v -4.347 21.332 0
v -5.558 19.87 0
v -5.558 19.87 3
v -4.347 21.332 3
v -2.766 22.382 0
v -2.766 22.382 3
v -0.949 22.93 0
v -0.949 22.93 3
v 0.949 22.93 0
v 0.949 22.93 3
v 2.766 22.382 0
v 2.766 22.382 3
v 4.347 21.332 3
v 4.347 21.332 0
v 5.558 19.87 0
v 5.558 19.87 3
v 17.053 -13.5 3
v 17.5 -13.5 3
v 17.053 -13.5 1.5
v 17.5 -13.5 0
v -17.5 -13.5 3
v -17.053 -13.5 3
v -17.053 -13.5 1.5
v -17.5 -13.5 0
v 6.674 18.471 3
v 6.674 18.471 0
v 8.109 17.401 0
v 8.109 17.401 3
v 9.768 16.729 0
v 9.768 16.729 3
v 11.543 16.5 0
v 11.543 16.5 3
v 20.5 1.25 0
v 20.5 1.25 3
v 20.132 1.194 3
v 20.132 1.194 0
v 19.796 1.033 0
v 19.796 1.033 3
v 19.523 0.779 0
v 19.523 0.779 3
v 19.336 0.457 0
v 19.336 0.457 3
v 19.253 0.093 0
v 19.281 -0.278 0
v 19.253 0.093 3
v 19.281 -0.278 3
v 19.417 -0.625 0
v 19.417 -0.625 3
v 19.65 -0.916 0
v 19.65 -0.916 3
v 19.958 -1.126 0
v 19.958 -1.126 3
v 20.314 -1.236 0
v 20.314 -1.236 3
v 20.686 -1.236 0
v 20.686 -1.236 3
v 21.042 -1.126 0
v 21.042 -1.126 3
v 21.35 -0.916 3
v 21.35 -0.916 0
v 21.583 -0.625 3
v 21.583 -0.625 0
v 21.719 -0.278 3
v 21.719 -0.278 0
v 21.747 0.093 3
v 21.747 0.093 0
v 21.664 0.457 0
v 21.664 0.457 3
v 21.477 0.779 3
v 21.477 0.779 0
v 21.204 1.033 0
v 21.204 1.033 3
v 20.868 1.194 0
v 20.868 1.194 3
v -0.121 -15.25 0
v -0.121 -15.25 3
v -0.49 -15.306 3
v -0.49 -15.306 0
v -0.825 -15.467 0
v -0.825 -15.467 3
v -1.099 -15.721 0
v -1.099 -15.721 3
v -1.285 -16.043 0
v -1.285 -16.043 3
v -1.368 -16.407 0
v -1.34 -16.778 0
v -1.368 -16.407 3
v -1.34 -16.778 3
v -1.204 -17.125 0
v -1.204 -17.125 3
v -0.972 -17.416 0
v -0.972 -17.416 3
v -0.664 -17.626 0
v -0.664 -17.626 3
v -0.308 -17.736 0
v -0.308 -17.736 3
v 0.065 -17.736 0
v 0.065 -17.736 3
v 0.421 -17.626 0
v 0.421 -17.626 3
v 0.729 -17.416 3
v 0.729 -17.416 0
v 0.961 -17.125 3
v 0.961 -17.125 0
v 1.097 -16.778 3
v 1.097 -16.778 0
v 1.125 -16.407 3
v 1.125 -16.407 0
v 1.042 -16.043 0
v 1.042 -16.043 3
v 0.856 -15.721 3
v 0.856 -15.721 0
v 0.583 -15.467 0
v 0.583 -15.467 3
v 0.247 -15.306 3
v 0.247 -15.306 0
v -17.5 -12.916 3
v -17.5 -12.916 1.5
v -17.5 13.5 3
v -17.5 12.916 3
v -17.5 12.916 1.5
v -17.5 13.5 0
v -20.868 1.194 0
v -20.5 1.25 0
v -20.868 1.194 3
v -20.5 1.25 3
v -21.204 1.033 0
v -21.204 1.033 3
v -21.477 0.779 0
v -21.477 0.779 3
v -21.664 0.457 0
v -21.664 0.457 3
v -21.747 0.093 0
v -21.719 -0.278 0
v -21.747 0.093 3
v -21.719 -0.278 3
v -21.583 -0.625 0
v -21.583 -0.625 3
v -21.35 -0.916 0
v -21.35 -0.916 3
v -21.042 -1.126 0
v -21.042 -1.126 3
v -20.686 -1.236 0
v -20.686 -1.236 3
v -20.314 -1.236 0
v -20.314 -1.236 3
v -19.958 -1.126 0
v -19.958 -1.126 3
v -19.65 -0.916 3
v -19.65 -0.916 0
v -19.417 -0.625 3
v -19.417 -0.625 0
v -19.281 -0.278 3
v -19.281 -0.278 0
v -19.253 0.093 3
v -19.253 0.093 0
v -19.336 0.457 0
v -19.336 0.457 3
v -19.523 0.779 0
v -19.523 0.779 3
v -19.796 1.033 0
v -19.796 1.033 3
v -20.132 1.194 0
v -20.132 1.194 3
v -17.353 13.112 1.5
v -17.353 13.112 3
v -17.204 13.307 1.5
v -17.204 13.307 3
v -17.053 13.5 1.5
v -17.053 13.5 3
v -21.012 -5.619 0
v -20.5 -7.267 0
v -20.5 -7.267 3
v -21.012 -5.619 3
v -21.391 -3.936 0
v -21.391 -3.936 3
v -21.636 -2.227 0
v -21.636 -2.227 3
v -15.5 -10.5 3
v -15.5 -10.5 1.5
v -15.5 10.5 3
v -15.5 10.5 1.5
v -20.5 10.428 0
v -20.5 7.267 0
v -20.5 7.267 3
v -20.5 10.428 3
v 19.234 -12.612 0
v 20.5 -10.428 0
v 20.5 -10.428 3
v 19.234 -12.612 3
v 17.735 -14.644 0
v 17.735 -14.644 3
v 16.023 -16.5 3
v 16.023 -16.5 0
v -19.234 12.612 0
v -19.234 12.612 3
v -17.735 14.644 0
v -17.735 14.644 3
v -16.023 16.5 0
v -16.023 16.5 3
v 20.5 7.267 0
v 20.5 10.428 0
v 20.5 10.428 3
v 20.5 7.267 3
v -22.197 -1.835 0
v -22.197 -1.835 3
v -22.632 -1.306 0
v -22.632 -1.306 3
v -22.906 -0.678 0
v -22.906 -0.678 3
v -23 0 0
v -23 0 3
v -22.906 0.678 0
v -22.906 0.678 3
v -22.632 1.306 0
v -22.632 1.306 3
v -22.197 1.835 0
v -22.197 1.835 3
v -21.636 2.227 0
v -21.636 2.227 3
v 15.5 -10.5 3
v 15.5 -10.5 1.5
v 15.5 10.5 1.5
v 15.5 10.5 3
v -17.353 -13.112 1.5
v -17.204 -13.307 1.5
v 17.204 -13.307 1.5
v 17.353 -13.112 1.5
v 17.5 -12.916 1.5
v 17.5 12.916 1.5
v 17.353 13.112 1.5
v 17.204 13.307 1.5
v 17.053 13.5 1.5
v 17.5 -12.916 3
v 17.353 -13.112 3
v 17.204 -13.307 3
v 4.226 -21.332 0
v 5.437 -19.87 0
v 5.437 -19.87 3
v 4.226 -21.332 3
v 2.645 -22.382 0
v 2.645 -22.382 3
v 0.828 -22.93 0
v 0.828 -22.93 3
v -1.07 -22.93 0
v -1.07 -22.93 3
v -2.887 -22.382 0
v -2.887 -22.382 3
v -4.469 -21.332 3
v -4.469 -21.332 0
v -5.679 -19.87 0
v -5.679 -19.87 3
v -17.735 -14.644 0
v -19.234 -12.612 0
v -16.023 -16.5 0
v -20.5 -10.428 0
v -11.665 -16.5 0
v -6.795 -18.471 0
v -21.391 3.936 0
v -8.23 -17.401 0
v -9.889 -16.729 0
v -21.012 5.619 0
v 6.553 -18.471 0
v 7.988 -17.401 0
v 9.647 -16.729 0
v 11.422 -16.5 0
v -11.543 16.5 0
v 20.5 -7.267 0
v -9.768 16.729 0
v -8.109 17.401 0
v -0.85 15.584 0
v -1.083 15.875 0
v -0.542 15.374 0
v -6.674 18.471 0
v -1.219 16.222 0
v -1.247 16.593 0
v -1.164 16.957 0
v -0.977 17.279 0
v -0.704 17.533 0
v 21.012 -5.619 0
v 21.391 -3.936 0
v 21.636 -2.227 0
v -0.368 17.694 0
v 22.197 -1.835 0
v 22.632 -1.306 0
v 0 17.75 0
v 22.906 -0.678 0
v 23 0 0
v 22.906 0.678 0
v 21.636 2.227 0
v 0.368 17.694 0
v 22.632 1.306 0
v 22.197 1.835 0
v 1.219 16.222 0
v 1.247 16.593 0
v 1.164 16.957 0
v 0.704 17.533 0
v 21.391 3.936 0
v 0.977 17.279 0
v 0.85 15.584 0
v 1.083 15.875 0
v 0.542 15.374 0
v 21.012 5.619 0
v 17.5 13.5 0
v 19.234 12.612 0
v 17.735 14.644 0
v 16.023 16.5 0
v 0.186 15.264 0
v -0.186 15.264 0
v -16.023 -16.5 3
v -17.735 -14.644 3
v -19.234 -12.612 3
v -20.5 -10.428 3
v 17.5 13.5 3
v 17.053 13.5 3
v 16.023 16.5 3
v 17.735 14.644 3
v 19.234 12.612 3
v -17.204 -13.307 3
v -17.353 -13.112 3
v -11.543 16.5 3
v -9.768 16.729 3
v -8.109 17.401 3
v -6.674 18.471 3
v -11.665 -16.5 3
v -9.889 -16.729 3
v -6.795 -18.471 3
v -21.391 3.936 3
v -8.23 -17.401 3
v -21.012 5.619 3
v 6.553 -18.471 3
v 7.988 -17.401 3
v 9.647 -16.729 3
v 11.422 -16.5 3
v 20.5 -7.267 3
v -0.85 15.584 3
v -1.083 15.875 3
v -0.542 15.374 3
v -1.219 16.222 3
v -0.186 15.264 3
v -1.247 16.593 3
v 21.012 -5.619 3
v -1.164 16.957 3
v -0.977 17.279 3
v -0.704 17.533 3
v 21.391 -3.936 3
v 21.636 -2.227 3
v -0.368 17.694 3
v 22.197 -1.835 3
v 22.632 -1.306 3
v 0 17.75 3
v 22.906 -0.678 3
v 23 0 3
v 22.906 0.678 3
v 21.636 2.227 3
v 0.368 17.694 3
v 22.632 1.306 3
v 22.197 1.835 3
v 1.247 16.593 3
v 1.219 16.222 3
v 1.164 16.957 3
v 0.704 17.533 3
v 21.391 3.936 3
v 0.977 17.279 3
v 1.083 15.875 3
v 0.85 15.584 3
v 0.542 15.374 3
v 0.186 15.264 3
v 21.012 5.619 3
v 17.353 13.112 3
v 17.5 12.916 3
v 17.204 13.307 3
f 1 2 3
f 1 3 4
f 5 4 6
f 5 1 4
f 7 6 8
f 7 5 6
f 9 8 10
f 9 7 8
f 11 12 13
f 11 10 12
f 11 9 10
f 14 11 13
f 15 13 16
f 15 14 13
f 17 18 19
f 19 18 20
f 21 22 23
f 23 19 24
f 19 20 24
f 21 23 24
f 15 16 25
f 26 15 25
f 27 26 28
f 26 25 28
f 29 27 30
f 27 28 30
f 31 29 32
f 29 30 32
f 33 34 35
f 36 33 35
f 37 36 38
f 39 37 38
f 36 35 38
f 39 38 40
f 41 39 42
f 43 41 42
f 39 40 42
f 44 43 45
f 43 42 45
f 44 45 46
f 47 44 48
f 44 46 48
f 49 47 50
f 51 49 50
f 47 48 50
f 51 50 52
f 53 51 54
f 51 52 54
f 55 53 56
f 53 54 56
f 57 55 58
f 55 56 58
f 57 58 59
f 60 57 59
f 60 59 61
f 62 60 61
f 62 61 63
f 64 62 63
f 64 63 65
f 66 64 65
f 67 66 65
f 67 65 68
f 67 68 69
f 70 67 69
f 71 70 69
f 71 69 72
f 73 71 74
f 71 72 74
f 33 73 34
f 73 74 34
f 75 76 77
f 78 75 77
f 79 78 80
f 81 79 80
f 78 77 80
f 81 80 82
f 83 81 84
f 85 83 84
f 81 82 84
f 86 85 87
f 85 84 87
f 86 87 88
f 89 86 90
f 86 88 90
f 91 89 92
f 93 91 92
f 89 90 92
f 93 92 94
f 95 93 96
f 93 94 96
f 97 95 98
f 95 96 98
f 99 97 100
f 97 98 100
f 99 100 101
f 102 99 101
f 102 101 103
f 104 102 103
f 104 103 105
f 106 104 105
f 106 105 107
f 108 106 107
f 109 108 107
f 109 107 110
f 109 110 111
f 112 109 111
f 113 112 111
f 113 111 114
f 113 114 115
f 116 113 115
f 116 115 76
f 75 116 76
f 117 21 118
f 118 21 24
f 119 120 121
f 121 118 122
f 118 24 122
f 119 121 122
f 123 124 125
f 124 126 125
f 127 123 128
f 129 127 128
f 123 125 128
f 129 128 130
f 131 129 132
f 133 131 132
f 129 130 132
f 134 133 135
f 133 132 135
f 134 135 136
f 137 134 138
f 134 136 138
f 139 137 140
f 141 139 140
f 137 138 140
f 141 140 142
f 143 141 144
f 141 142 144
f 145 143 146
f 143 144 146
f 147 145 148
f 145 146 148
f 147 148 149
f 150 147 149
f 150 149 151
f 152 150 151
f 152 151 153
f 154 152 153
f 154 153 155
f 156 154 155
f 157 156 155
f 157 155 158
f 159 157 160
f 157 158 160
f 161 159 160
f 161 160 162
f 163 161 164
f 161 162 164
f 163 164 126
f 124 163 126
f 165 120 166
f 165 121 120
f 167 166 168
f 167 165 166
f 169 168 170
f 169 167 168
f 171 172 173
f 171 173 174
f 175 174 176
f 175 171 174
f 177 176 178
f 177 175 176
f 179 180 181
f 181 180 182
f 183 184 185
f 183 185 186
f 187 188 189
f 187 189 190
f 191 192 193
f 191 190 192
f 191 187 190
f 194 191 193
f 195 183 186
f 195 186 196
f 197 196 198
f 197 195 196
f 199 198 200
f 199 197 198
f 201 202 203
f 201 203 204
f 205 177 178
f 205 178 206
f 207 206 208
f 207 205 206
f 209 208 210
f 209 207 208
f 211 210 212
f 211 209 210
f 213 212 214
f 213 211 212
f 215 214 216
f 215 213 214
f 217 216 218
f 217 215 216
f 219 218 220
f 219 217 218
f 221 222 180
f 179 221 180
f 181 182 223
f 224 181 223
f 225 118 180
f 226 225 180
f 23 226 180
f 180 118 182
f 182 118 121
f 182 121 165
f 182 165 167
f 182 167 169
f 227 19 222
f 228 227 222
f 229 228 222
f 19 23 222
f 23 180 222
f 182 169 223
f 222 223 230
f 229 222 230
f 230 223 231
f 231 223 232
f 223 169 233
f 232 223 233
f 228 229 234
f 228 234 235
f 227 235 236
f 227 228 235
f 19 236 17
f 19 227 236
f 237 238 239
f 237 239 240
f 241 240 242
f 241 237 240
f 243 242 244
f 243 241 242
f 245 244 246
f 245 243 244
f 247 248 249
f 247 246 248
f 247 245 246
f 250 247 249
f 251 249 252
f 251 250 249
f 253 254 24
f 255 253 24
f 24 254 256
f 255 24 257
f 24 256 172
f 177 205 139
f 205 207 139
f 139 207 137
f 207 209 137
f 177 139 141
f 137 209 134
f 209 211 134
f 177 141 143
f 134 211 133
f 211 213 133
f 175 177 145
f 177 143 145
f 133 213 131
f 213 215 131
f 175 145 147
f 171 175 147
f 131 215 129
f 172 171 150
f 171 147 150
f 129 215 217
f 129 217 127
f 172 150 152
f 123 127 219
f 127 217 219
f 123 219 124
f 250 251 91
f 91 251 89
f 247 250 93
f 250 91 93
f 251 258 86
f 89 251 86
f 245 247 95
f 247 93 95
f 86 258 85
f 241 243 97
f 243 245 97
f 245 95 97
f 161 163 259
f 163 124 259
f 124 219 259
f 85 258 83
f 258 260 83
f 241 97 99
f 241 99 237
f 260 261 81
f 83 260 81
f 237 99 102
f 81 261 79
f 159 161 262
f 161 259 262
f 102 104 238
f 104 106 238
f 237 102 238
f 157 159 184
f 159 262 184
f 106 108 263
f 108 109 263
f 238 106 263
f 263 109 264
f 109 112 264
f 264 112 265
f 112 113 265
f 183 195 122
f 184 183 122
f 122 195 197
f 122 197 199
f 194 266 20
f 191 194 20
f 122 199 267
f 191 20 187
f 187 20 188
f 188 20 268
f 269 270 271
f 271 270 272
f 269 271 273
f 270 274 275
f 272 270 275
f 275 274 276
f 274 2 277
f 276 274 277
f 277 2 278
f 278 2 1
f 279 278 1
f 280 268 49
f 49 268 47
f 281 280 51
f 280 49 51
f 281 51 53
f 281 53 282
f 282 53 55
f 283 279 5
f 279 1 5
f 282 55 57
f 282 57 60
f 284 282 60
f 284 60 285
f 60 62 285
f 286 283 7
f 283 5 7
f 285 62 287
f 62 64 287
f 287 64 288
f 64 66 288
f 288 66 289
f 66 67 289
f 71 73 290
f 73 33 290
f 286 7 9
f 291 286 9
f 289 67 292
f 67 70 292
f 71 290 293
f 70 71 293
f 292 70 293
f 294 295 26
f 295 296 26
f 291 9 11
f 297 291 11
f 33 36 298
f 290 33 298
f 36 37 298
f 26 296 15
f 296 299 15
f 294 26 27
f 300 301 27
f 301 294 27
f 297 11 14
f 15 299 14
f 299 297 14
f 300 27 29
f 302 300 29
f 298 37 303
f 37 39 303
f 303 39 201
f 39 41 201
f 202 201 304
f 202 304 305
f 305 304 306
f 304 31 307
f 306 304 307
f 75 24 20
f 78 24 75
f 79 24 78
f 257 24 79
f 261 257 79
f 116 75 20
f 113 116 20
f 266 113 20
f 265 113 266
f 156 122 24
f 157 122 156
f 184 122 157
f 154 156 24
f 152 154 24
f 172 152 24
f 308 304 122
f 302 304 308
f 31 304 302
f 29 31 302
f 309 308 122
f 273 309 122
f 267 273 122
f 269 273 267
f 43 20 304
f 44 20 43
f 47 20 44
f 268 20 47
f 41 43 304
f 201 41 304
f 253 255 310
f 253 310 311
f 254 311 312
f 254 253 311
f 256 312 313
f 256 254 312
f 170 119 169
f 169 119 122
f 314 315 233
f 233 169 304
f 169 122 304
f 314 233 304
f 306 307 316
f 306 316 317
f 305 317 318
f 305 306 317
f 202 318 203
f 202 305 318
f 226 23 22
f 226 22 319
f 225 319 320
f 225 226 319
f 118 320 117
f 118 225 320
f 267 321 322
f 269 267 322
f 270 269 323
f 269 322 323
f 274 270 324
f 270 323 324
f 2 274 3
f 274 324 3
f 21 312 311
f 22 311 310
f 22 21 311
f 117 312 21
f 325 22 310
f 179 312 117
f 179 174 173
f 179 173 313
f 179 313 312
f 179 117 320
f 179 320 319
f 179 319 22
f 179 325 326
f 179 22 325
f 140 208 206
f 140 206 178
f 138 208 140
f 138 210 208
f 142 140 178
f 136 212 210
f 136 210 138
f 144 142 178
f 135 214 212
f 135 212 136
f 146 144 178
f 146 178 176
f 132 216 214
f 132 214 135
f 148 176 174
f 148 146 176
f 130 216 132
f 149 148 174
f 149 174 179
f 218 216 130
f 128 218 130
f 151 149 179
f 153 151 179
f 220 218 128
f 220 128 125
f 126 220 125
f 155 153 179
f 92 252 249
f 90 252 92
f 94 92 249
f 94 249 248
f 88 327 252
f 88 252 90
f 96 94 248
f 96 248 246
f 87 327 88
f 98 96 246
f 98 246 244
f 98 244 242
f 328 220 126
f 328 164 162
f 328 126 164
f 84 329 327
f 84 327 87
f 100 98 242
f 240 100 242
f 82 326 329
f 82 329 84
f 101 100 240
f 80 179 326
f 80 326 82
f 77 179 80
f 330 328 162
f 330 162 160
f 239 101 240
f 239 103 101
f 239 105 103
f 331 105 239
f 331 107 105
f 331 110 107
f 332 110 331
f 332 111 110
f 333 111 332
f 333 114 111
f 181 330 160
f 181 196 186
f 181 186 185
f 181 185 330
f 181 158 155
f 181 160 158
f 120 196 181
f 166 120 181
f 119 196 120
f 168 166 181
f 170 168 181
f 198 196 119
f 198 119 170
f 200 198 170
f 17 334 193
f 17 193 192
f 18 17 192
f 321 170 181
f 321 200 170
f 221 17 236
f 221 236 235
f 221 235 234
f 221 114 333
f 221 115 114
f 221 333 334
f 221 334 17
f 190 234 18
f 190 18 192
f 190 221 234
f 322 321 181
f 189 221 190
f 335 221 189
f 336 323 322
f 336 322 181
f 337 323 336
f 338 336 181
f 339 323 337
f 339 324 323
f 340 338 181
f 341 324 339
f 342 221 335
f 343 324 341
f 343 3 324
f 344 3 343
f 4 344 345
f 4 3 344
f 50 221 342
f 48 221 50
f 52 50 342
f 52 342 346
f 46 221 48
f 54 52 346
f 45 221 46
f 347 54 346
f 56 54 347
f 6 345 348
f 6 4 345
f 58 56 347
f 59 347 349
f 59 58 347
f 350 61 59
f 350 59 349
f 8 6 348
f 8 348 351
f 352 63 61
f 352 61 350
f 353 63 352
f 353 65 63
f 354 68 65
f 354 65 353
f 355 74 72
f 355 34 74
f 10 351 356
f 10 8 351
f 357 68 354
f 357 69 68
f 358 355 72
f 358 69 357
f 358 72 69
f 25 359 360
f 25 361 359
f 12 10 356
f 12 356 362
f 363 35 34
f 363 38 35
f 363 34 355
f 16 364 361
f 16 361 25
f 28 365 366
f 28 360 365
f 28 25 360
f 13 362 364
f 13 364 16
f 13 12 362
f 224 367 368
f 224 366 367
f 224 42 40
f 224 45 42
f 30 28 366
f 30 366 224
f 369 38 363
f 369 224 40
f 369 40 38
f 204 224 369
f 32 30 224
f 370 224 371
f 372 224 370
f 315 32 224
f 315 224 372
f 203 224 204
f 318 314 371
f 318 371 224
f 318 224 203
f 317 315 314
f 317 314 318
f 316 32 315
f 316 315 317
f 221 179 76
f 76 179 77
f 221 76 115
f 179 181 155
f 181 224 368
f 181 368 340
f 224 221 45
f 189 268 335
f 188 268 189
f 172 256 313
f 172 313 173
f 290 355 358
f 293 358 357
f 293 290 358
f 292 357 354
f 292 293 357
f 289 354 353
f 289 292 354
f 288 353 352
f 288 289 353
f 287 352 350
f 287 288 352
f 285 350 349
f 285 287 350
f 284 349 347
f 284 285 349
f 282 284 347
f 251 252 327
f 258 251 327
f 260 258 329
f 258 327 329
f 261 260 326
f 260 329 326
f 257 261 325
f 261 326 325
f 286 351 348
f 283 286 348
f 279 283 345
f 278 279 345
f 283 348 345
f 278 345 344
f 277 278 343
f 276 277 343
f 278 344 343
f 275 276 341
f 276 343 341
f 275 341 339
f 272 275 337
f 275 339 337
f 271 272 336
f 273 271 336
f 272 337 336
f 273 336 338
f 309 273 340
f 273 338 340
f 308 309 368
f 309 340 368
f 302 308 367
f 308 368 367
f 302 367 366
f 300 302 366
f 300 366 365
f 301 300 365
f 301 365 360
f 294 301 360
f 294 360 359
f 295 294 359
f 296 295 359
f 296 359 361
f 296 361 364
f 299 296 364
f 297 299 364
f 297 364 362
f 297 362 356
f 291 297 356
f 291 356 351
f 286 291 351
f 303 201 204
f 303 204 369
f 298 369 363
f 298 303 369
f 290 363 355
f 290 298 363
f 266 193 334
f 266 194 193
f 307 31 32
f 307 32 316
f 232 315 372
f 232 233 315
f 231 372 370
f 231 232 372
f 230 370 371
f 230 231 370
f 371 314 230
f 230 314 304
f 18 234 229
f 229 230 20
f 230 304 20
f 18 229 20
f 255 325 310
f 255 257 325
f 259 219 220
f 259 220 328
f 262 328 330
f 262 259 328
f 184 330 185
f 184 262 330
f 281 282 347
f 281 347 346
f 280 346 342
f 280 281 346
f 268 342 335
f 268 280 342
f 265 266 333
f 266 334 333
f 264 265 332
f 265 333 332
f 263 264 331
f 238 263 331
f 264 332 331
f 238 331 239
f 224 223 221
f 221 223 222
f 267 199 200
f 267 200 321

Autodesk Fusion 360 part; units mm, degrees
sketch "Skizze1" plane through (0, 0, 0) normal (0, 0, 1) x (1, 0, 0)
  circle A0 centre (0, 0) radius 24.75
  circle A1 centre (0, 0) radius 21.75
  line L0 (-17.5, 13.5) -> (17.5, 13.5)
  line L1 (17.5, 13.5) -> (17.5, -13.5)
  line L2 (17.5, -13.5) -> (-17.5, -13.5)
  line L3 (-17.5, -13.5) -> (-17.5, 13.5)
  line L4 (-40, 0) -> (50, 0) construction
  line L5 (0, 45.7661) -> (0, -44.2339) construction
  line L6 (-16.0234, 16.5) -> (16.0234, 16.5)
  line L7 (20.5, 10.4283) -> (20.5, -10.4283)
  line L8 (16.0234, -16.5) -> (-16.0234, -16.5)
  line L9 (-20.5, -10.4283) -> (-20.5, 10.4283)
  arc A2 (6.5, 16.5) -> (-6.5, 16.5) centre (0, 16.5) ccw
  arc A3 (-6.6213, -16.5) -> (6.3787, -16.5) centre (-0.1213, -16.5) ccw
  arc A4 (-21.6357, 2.2272) -> (-21.6357, -2.2272) centre (-20.5, 0) ccw
  arc A5 (21.6357, -2.2272) -> (21.6357, 2.2272) centre (20.5, 0) ccw
  circle A6 centre (0, 0) radius 23
  line L10 (-14.5, -7.5) -> (14.5, -7.5)
  line L11 (14.5, -7.5) -> (14.5, 7.5)
  line L12 (14.5, 7.5) -> (-14.5, 7.5)
  line L13 (-14.5, 7.5) -> (-14.5, -7.5)
  line L14 (-15.5, 10.5) -> (15.5, 10.5)
  line L15 (15.5, 10.5) -> (15.5, -10.5)
  line L16 (15.5, -10.5) -> (-15.5, -10.5)
  line L17 (-15.5, -10.5) -> (-15.5, 10.5)
  dimension "d1" = 49.5
  dimension "d3" = 3
  dimension "d4" = 27
  dimension "d5" = 35
  dimension "d6" = 3
  dimension "d7" = 3
  dimension "d8" = 3
  dimension "d9" = 3
  dimension "d18" = 46
  dimension "d19" = 29
  dimension "d20" = 15
  dimension "d27" = 3
  dimension "d28" = 3
  dimension "d29" = 2
  dimension "d30" = 2
  dimension "d40" = 33
extrude "Extrusion5" add sketch "Skizze1" along normal blind 3 contours A1 L7 | A1 A5 | A1 L1 L7 | A1 L0 L1 L6 L7 A6 | A1 L1 L2 L7 L8 A6 | A1 L0 L6 | A1 L2 L8 | A1 L0 L3 L6 L9 A6 | A1 A2 | A1 A3 | A1 L2 L3 L8 L9 A6 | A1 L6 A2 | A1 L3 L9 | A1 L8 A3 | A1 L9 | A1 A4 picked at (0.4894, 18.2335) picked at (-0.6234, -18.2297)
extrude "Extrusion6" add sketch "Skizze1" along normal up to surface (1.5 mm away) from surface at 1.5 contours A1 L0 L1 L2 L3
hole "Bohrung1" at (0, 16.5, 0) at (20.5, 0, 0) at (-0.1213, -16.5, 0) at (-20.5, 0, 0) direction (0, 0, 1) diameter 2.5 end through all
fillet "Abrundung1" radius 7 4 edges at (-6.6213, -16.5, 1.5) (6.3787, -16.5, 1.5) (6.5, 16.5, 1.5) (-6.5, 16.5, 1.5)
